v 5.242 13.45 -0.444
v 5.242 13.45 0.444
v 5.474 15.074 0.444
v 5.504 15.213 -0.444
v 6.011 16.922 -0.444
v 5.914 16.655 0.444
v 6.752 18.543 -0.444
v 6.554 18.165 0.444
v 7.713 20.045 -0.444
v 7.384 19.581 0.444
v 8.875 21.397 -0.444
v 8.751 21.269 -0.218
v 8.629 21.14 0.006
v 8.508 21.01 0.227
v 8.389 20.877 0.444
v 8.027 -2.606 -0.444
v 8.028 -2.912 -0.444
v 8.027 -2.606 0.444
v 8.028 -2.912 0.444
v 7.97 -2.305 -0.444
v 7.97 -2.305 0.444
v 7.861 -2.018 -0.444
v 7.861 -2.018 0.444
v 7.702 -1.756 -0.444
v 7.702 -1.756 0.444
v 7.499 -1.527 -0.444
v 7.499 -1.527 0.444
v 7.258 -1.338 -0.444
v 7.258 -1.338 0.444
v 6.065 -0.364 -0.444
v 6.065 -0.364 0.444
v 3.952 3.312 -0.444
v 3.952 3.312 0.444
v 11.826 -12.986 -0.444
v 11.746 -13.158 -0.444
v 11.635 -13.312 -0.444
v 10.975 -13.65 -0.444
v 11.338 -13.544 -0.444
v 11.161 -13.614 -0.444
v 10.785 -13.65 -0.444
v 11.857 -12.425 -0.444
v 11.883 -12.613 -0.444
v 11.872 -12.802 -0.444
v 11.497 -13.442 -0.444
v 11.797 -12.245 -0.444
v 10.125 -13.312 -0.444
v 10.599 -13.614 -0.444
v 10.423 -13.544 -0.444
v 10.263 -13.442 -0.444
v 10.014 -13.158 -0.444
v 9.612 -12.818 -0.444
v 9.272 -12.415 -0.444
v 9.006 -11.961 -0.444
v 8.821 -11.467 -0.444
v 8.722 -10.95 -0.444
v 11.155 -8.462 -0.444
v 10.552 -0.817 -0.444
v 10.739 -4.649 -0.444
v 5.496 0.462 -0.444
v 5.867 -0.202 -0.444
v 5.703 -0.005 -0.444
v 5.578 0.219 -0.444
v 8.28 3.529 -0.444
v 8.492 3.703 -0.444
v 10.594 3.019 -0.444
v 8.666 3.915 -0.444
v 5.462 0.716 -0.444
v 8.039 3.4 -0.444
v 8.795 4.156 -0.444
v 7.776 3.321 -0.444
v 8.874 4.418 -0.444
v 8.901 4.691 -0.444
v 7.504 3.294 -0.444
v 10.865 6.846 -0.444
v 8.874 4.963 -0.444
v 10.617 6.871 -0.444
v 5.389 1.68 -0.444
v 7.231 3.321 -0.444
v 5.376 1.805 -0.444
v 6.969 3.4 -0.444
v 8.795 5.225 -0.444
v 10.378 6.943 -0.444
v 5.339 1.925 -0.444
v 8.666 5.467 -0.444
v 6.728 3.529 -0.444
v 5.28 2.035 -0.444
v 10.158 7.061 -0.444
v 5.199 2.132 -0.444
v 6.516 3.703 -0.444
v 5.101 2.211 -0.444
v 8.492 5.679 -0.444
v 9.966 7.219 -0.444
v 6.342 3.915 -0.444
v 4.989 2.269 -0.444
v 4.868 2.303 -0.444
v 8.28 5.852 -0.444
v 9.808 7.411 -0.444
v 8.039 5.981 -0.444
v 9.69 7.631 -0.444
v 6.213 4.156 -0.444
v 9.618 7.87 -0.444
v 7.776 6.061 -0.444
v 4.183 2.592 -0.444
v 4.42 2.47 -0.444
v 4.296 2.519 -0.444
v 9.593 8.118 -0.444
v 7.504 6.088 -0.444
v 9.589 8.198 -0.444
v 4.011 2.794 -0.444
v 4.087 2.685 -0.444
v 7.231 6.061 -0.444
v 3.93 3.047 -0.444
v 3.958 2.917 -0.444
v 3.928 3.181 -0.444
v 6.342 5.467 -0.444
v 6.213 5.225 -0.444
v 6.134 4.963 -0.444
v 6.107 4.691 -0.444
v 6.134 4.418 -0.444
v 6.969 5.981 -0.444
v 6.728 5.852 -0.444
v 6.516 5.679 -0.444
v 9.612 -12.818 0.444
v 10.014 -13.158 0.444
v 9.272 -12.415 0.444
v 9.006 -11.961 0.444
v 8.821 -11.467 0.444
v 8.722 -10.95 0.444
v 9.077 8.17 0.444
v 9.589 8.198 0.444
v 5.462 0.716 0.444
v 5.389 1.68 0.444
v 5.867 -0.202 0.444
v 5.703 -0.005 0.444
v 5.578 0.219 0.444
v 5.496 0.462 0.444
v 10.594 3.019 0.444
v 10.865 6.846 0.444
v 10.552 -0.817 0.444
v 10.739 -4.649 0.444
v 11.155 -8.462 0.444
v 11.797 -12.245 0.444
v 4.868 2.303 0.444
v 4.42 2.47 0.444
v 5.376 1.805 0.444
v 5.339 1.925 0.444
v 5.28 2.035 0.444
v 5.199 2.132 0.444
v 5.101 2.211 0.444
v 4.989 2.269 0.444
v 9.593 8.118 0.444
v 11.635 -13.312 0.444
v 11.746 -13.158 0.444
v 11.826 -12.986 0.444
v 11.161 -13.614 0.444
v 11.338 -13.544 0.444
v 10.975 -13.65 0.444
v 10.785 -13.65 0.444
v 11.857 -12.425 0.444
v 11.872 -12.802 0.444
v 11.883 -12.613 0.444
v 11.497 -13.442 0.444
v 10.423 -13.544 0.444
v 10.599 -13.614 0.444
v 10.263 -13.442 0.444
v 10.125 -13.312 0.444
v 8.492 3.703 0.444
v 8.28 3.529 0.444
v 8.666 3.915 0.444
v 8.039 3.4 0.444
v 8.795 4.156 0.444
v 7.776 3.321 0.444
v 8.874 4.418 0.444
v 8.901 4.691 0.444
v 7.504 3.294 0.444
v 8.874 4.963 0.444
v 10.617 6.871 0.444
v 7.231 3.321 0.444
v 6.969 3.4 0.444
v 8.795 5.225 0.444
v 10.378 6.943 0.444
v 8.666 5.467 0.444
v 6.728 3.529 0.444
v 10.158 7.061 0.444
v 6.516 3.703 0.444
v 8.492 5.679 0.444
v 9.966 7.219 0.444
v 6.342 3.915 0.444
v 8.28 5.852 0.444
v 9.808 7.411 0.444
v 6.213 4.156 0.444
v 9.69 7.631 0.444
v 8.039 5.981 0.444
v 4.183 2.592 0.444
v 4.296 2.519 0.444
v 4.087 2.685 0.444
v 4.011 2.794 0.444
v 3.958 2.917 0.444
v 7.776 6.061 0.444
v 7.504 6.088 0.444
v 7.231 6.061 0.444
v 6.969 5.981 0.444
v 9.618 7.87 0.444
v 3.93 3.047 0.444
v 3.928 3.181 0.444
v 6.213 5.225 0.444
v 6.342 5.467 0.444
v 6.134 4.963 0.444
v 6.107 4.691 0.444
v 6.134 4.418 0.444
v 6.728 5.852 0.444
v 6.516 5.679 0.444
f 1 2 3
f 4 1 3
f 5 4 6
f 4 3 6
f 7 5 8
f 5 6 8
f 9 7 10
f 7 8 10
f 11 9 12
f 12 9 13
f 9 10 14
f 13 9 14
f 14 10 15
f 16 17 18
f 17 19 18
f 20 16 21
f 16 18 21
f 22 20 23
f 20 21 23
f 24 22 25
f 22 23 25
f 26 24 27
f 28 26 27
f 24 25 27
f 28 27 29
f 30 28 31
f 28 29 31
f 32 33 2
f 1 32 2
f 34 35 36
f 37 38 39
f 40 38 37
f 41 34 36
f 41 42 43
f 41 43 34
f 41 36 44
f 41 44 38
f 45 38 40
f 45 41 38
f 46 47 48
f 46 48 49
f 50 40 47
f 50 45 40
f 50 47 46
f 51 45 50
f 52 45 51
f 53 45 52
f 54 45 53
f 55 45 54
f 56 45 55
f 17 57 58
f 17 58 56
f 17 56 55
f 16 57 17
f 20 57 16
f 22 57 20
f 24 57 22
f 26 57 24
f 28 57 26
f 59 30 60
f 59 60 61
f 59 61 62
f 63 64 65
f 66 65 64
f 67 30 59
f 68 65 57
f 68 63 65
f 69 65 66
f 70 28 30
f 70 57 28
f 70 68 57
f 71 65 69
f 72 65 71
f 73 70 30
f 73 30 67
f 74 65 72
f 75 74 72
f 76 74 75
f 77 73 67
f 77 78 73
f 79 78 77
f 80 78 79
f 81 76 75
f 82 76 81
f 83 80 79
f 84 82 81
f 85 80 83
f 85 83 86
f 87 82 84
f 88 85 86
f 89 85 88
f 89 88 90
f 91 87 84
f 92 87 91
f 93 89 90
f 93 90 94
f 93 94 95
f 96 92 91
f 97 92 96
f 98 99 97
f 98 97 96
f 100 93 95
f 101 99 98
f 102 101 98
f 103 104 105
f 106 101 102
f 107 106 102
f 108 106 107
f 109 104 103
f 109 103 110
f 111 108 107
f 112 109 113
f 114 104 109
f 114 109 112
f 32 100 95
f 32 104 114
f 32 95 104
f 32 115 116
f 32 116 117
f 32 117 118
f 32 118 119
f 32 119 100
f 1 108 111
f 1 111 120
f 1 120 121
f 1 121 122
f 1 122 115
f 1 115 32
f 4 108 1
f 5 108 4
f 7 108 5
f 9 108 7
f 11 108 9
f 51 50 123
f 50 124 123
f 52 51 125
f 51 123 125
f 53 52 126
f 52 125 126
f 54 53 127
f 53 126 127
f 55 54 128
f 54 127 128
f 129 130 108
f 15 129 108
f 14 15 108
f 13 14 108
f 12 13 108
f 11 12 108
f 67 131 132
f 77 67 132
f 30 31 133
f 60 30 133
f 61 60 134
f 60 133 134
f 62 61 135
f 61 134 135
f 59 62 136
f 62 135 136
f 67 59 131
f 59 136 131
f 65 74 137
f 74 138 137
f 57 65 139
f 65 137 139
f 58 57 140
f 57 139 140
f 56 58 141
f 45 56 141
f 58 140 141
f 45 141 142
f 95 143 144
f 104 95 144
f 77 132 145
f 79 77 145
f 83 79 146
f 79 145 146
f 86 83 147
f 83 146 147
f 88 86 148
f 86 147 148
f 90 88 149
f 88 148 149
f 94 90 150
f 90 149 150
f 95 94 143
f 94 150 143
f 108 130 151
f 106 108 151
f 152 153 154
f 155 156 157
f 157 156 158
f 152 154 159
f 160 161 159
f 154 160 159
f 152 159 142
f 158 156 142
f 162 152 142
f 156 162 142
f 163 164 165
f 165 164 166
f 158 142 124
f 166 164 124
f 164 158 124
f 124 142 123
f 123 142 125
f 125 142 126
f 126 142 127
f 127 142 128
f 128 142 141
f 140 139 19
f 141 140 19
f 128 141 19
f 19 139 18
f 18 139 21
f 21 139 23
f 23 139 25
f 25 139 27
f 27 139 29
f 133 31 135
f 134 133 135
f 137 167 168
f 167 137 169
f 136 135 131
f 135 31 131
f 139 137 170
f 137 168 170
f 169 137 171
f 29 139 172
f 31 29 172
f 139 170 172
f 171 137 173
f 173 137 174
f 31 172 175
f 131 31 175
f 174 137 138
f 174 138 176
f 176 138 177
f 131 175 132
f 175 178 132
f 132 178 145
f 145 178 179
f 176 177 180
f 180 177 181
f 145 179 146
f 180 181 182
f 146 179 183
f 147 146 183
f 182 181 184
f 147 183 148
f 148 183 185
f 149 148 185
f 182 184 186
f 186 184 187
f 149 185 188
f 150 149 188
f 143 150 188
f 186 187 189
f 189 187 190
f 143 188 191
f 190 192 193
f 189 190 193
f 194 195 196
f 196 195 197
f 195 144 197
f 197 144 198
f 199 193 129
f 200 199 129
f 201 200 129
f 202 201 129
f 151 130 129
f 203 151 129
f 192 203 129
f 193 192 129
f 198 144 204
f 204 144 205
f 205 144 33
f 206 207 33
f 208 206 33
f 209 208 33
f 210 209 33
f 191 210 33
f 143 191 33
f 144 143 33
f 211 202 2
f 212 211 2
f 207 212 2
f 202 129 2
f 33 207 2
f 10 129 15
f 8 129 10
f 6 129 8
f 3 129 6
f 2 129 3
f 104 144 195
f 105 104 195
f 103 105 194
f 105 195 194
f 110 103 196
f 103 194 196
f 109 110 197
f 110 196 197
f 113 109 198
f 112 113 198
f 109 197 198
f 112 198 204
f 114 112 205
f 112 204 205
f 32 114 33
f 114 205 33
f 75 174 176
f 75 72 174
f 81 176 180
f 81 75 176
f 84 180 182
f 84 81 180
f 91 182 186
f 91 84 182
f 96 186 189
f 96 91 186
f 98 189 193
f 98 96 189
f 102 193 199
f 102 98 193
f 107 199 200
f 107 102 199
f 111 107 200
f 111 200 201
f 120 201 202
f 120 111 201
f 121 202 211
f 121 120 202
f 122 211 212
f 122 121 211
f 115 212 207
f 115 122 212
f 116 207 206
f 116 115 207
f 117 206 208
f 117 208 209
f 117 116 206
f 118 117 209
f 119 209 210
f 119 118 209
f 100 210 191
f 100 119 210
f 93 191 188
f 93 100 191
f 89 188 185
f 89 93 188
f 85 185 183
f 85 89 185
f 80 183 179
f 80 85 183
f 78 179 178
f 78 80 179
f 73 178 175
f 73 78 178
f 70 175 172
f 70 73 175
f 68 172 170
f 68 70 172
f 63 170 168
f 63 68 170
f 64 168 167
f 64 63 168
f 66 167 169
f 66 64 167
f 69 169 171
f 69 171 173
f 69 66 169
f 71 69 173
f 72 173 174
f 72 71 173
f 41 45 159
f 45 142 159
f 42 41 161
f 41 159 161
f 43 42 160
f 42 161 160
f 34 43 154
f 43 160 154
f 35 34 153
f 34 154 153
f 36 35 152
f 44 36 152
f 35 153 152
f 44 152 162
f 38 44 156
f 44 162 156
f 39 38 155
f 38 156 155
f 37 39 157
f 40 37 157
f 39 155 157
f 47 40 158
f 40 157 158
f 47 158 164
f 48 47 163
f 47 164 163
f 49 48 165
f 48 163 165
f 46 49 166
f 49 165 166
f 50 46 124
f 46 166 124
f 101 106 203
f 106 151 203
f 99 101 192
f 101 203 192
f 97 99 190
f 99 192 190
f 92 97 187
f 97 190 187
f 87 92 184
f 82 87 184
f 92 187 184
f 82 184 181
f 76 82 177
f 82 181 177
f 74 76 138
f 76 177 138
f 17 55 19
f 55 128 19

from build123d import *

# Parameters (mm, degrees)
SKETCH1_R           = 1.397
BOSS_EXTRUDE1_DEPTH = 0.4445
CUT_EXTRUDE4_DEPTH  = 16.51


with BuildPart() as part:
    # Sketch1 → Boss-Extrude1 (new body, symmetric)
    with BuildSketch(Plane.XY):
        with BuildLine():
            Line((8.875350221, 21.396721542), (9.593451212, 8.117540032))
            ThreePointArc((9.593451212, 8.117540032), (9.965793887, 7.218625297), (10.864708622, 6.846282623))
            ThreePointArc((10.864708622, 6.846282623), (10.617082025, -2.734099475), (11.797183673, -12.24474615))
            ThreePointArc((11.797183673, -12.24474615), (11.337518417, -13.544150853), (10.014382728, -13.158072262))
            ThreePointArc((10.014382728, -13.158072262), (9.129349257, -12.193661404), (8.721848155, -10.949750073))
            Line((8.721848155, -10.949750073), (8.027558013, -2.912032354))
            ThreePointArc((8.027558013, -2.912032354), (7.861230576, -2.018292431), (7.257903508, -1.338268672))
            Line((7.257903508, -1.338268672), (6.065443849, -0.36416915))
            ThreePointArc((6.065443849, -0.36416915), (5.635017487, 0.104064915), (5.461813548, 0.716037454))
            Line((5.461813548, 0.716037454), (5.388890296, 1.679566547))
            ThreePointArc((5.388890296, 1.679566547), (5.241652075, 2.085780608), (4.868329056, 2.303309644))
            Line((4.868329056, 2.303309644), (4.419812025, 2.47021505))
            ThreePointArc((4.419812025, 2.47021505), (4.011456456, 2.79440081), (3.951939413, 3.312385751))
            Line((3.951939413, 3.312385751), (5.241652075, 13.449796826))
            ThreePointArc((5.241652075, 13.449796826), (6.353290153, 17.745713967), (8.875350221, 21.396721542))
        make_face()
        with Locations((7.503950751, 4.690757252)):
            Circle(SKETCH1_R, mode=Mode.SUBTRACT)
    extrude(amount=BOSS_EXTRUDE1_DEPTH, both=True)

    # Sketch2 → Cut-Extrude4 (cut)
    with BuildSketch(Plane(origin=(-1.305559533, 24.142512274, 0), x_dir=(0.998541027, 0.053998306, 0), z_dir=(-0.053998306, 0.998541027, 0))):
        Polygon((10.017788036, 0.4445), (10.017788036, -0.4445), (9.504523646, -0.4445), align=None)
    extrude(amount=-CUT_EXTRUDE4_DEPTH, mode=Mode.SUBTRACT)


solid = part.part
